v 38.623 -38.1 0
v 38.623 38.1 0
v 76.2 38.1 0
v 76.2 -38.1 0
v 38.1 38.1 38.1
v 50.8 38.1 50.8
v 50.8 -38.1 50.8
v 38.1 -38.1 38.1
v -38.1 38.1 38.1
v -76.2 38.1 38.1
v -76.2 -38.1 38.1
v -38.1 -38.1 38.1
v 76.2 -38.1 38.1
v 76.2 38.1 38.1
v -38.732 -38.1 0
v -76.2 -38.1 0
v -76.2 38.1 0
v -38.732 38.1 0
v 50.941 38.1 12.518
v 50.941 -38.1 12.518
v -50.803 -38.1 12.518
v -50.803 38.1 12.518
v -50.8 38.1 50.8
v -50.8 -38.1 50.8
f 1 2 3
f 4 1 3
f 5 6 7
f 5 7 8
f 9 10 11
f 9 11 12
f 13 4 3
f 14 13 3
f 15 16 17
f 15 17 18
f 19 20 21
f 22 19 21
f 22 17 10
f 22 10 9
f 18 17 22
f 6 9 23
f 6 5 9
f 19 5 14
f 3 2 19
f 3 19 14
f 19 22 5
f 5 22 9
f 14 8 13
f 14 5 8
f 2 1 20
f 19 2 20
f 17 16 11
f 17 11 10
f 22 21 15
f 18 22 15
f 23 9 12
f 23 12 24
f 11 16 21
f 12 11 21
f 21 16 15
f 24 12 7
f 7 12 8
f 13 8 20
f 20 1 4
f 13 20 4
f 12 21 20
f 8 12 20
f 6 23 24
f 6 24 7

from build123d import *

# Parameters (mm, degrees)
F0_W      = 152.4
F0_H      = 76.2
F1_DEPTH  = 50.8
F2_W      = 25.4
F2_H      = 76.2
F3_DEPTH  = 12.7
F4_W      = 25.4
F4_H      = 76.2
F5_DEPTH  = 12.7
F7_DEPTH  = 76.201
F9_DEPTH  = 76.201
F12_DEPTH = 76.201


with BuildPart() as f1:
    # F0 (on Top) → F1 (new body)
    with BuildSketch(Plane.XY):
        Rectangle(F0_W, F0_H)
    extrude(amount=F1_DEPTH)

    # F2 (on face) → F3 (cut)
    with BuildSketch(Plane.XY.offset(50.8)):
        with Locations((63.5, 0)):
            Rectangle(F2_W, F2_H)
    extrude(amount=-F3_DEPTH, mode=Mode.SUBTRACT)

    # F4 (on face) → F5 (cut)
    with BuildSketch(Plane.XY.offset(50.8)):
        with Locations((-63.5, 0)):
            Rectangle(F4_W, F4_H)
    extrude(amount=-F5_DEPTH, mode=Mode.SUBTRACT)

    # F6 (on face) → F7 (cut, through all)
    with BuildSketch(Plane.XZ.offset(38.1)):
        Polygon((-50.8, 50.8), (-50.8, 38.1), (-38.1, 38.1), align=None)
    extrude(amount=-F7_DEPTH, mode=Mode.SUBTRACT)

    # F8 (on face) → F9 (cut, through all)
    with BuildSketch(Plane.XZ.offset(38.1)):
        Polygon((38.1, 38.1), (50.8, 38.1), (50.8, 50.8), align=None)
    extrude(amount=-F9_DEPTH, mode=Mode.SUBTRACT)

    # F11 (on face) → F12 (cut, through all)
    with BuildSketch(Plane.XZ.offset(38.1)):
        Polygon((-50.802752, 12.51767), (-38.731508, 0), (38.622994, 0), (50.940588, 12.51767), align=None)
    extrude(amount=-F12_DEPTH, mode=Mode.SUBTRACT)


solid = f1.part
